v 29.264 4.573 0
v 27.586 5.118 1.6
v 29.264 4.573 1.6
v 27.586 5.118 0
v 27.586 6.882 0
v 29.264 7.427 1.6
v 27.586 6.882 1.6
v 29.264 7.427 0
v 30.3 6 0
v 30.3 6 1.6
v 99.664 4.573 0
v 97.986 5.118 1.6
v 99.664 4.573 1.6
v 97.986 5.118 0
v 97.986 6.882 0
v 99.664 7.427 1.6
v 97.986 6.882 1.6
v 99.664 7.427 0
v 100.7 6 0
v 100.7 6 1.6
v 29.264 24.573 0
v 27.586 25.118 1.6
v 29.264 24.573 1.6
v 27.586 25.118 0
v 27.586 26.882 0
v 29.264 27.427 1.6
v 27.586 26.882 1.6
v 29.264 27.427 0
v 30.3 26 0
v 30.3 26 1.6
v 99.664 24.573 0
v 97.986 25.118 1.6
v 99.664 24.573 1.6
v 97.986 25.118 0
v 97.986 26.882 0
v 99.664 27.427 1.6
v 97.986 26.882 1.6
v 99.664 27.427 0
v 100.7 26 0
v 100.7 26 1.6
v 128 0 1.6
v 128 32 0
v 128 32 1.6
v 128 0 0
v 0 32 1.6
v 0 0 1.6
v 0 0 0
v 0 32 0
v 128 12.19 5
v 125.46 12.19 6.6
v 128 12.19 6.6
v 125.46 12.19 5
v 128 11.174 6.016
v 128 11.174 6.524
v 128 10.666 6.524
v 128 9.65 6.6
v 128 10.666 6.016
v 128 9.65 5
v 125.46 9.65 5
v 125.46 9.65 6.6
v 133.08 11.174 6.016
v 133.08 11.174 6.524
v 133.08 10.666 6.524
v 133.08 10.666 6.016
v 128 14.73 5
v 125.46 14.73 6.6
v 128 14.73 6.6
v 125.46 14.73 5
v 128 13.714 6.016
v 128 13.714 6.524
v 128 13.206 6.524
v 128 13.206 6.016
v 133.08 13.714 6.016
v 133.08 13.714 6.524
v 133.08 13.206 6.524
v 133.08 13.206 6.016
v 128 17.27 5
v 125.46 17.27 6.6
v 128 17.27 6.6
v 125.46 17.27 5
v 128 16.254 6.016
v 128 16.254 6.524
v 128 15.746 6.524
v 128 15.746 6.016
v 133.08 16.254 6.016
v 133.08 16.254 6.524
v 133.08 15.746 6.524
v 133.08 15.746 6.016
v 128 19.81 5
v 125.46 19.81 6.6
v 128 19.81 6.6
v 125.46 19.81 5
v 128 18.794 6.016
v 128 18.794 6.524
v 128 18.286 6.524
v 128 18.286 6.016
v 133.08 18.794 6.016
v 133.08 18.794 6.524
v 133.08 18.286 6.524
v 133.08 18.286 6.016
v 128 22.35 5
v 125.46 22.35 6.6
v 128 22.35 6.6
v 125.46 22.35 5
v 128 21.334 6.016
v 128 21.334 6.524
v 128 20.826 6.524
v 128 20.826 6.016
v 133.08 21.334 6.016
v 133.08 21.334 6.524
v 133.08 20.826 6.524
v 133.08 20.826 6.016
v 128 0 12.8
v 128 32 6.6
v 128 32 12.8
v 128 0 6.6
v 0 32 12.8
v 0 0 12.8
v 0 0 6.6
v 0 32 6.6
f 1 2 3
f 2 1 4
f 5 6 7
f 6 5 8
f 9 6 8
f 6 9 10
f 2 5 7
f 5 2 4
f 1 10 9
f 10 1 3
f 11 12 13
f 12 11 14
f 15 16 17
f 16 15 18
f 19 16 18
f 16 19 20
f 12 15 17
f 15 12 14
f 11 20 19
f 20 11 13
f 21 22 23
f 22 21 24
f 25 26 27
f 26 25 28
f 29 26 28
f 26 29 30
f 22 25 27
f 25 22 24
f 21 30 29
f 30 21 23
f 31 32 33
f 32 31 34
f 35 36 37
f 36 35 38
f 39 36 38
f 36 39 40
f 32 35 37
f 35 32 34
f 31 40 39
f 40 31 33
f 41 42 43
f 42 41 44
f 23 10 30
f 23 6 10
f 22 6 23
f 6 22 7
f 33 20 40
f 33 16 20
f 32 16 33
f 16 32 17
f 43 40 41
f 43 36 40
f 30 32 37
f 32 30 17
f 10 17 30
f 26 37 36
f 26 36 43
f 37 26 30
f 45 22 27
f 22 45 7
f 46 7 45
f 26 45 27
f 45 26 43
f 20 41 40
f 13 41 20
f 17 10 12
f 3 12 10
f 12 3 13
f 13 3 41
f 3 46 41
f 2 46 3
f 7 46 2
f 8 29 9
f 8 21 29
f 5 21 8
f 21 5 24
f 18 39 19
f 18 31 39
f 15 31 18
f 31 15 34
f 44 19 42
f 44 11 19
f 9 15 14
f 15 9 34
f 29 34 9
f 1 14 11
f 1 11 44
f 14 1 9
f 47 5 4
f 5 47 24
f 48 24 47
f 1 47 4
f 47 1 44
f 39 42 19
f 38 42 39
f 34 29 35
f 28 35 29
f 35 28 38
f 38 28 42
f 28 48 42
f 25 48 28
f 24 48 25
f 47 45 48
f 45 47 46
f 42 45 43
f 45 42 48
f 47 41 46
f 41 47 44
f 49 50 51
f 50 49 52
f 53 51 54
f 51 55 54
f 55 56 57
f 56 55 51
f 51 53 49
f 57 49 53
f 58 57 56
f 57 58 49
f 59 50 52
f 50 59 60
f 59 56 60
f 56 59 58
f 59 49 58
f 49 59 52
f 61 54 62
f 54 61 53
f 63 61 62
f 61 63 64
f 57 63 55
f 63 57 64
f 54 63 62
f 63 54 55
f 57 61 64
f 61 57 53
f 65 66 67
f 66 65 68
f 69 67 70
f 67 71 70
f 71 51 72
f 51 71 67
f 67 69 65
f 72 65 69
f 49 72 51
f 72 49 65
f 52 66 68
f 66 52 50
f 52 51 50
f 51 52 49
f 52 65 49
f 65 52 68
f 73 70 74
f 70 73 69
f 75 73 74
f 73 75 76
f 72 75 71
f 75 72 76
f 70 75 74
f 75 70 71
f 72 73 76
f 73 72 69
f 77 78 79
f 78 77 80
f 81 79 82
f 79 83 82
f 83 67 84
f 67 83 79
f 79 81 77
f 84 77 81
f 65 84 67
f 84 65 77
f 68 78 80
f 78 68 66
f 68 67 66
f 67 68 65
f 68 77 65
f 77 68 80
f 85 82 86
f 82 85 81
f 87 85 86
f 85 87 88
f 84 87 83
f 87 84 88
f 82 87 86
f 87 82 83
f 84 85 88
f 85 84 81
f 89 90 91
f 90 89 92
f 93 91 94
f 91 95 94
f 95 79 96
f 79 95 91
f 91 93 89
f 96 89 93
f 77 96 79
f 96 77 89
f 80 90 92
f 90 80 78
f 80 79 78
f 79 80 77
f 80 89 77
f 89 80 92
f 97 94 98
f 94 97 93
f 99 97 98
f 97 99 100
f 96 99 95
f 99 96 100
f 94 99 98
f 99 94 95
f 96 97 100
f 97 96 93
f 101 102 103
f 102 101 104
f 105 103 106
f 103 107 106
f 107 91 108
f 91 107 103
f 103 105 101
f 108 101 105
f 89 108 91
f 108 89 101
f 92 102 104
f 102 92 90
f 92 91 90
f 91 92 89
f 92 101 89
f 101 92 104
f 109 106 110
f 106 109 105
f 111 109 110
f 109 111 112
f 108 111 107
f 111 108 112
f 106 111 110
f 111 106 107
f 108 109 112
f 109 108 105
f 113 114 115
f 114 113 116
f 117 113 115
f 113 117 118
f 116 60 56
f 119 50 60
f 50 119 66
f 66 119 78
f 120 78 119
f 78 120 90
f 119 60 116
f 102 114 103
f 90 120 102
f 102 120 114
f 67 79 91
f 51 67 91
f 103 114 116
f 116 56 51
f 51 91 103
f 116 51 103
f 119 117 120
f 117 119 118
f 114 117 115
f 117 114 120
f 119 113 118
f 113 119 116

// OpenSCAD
// file: common.scad
// A library of common modules, functions and variables

// Extra dimension to remove ambiguity of walls
ex = 0.001;

// Hole dimension correction - if 3D printed holes turn out too small,
// increase the value (e.g. 1.1 = 110%), or reduce the value (e.g. 0.9 = 90%).
// Default value is 1.0 (100%)
hdc = 1.1;

// Some nuts and bolts dimensions
m3_bolt_head_dia = 6*hdc;
m3_bolt_head_height = 2;
m3_dia = 3*hdc;


module rounded_rect(x, y, z, radius = 1) {
    // Draws a rounded rectangle
    translate([radius,radius,0]) //move origin to outer limits
	linear_extrude(height=z)
		minkowski() {
			square([x-2*radius,y-2*radius]); //keep outer dimensions given by x and y
			circle(r = radius, $fn=100);
		}
}


module cylinder_quarter(r, h){
    // Draws quarter of a cylinder
    difference(){
        cylinder(r=r, h=h);
        translate ([-r-ex, -r-ex, -ex]) cube([2*r + 2*ex, r + ex, h + 2*ex]);
        translate ([-r-ex, -ex, -ex]) cube([r + ex, r + ex, h + 2*ex]);
    }
}


module header_pin(rows=1, columns=1){
    // Draws 2.54 mm male header pins
    base_width = 2.54;
    base_height = 2.54;
    header_width = 0.508;
    header_height = 5.08;
    trans = base_width/2 - header_width/2;

    for (i = [0: rows - 1]){
        for (j = [0: columns -1]){
            translate([j*base_width, i*base_width, 0]){
                color("Black") cube([base_width, base_width, base_height]);
                translate([trans , trans, base_height])
                    color("Khaki") cube([header_width, header_width, header_height]);
            }
        }
    }

}

module m3_bolt(length = 10){
    // M3 bolt mockup
    union(){
        cylinder(d = m3_dia, h = length);
        translate([0, 0, length - ex - m3_bolt_head_height]) 
            cylinder(d = m3_bolt_head_dia, h = m3_bolt_head_height + ex);
    }
}

module m3_nut_trap(){
    // Makes M3 nut trap inset
    cylinder(r=5.5/2/cos(180/6)*hdc, h=2, $fn=6);
}
// main file
// LED matrix 32x8 module model by Mikrotron d.o.o.

include <common.scad>;

// LED matrix
led_matrix_width = 32.0;
led_matrix_height = 6.2;
led_matrix_offset = 5.0; // offset from PCB varies, this is mean value

// Module PCB
module_pcb_height = 1.6; // width and length are equal to LED matrix dimensions
module_pcb_hole_dia = 3.3/hdc; // see common.scad for hdc definition
module_pcb_hole_offset_x = 3.2;
module_pcb_hole_offset_y = 6.0;
// There are 16 holes, we'll draw only the ones we need
module_pcb_hole_pos = [[led_matrix_width - module_pcb_hole_offset_x, module_pcb_hole_offset_y, -ex],
            [3*led_matrix_width + module_pcb_hole_offset_x, module_pcb_hole_offset_y, -ex],
            [led_matrix_width - module_pcb_hole_offset_x, led_matrix_width - module_pcb_hole_offset_y , -ex],
            [3*led_matrix_width + module_pcb_hole_offset_x, led_matrix_width - module_pcb_hole_offset_y, -ex]];

// Headers
module_pcb_header_x = 4*led_matrix_width - 2.54;
module_pcb_header_y = led_matrix_width/2 - 12.7/2;
module_pcb_header_z = 5;

// Entry point, uncomment the line bellow to see the object
led_matrix_32x8();

module led_matrix_32x8(){
    draw_pcb();
    translate([0, 0, module_pcb_height + led_matrix_offset]) color("White") 
        cube([4*led_matrix_width, led_matrix_width, led_matrix_height]);
    translate([module_pcb_header_x, module_pcb_header_y, module_pcb_header_z])
        rotate([90, 0, 90]) header_pin(1,5);
}

module draw_pcb(){
    difference(){
        color("SteelBlue") cube([4*led_matrix_width, led_matrix_width, module_pcb_height]);
        for(i = [0 : 3])
            translate(module_pcb_hole_pos[i]) cylinder(d=module_pcb_hole_dia, h=module_pcb_height + 2*ex);
    }
    
}
